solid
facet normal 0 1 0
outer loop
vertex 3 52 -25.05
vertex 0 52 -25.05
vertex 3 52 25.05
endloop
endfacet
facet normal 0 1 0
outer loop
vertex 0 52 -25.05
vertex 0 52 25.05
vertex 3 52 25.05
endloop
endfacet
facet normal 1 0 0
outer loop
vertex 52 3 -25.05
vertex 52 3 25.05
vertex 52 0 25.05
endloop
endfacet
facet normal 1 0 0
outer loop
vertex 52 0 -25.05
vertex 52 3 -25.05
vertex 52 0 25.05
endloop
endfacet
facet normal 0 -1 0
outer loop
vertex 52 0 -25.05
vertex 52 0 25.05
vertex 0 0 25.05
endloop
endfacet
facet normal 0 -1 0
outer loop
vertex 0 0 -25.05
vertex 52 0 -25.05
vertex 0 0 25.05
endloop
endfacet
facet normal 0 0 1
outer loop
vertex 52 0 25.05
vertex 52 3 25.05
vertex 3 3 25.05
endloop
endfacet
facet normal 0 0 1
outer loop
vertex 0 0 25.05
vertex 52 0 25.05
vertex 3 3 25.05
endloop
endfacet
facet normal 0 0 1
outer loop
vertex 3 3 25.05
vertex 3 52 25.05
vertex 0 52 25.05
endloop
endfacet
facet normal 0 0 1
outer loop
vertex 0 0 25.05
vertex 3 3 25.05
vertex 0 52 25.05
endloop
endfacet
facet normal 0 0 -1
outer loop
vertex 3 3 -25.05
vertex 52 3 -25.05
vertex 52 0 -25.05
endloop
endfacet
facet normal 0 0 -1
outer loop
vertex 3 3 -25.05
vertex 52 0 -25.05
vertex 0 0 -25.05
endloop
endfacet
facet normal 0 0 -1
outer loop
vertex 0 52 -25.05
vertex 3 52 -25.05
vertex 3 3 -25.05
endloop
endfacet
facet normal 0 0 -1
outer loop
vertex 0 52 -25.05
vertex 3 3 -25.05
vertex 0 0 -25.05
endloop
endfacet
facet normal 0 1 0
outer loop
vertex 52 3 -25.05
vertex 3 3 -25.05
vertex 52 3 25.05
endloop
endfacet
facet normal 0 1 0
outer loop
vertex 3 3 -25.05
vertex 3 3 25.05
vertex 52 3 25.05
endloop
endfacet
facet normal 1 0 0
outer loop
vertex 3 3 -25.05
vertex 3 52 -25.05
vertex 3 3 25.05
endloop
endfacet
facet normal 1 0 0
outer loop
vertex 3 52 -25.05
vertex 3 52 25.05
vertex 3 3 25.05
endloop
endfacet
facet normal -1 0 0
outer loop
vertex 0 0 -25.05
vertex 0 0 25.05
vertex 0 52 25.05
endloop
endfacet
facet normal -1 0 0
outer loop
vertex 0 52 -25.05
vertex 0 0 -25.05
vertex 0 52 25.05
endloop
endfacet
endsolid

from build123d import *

# Parameters (mm, degrees)
BOSS_EXTRUDE1_DEPTH = 25.05


with BuildPart() as part:
    # Sketch1 → Boss-Extrude1 (new, symmetric)
    with BuildSketch(Plane.XY):
        Polygon((0, 0), (0, 52), (3, 52), (3, 3), (52, 3), (52, 0), align=None)
    boss_extrude1 = extrude(amount=BOSS_EXTRUDE1_DEPTH, both=True)


with BuildPart() as mirror1_1:
    # Mirror1: Boss-Extrude1 across plane
    add(boss_extrude1.mirror(Plane.XY))


with BuildPart() as part_1:
    add(part.part)

    # Mirror1 united with what the copies touc: union Mirror1_1
    add(mirror1_1.part)


solid = part_1.part
